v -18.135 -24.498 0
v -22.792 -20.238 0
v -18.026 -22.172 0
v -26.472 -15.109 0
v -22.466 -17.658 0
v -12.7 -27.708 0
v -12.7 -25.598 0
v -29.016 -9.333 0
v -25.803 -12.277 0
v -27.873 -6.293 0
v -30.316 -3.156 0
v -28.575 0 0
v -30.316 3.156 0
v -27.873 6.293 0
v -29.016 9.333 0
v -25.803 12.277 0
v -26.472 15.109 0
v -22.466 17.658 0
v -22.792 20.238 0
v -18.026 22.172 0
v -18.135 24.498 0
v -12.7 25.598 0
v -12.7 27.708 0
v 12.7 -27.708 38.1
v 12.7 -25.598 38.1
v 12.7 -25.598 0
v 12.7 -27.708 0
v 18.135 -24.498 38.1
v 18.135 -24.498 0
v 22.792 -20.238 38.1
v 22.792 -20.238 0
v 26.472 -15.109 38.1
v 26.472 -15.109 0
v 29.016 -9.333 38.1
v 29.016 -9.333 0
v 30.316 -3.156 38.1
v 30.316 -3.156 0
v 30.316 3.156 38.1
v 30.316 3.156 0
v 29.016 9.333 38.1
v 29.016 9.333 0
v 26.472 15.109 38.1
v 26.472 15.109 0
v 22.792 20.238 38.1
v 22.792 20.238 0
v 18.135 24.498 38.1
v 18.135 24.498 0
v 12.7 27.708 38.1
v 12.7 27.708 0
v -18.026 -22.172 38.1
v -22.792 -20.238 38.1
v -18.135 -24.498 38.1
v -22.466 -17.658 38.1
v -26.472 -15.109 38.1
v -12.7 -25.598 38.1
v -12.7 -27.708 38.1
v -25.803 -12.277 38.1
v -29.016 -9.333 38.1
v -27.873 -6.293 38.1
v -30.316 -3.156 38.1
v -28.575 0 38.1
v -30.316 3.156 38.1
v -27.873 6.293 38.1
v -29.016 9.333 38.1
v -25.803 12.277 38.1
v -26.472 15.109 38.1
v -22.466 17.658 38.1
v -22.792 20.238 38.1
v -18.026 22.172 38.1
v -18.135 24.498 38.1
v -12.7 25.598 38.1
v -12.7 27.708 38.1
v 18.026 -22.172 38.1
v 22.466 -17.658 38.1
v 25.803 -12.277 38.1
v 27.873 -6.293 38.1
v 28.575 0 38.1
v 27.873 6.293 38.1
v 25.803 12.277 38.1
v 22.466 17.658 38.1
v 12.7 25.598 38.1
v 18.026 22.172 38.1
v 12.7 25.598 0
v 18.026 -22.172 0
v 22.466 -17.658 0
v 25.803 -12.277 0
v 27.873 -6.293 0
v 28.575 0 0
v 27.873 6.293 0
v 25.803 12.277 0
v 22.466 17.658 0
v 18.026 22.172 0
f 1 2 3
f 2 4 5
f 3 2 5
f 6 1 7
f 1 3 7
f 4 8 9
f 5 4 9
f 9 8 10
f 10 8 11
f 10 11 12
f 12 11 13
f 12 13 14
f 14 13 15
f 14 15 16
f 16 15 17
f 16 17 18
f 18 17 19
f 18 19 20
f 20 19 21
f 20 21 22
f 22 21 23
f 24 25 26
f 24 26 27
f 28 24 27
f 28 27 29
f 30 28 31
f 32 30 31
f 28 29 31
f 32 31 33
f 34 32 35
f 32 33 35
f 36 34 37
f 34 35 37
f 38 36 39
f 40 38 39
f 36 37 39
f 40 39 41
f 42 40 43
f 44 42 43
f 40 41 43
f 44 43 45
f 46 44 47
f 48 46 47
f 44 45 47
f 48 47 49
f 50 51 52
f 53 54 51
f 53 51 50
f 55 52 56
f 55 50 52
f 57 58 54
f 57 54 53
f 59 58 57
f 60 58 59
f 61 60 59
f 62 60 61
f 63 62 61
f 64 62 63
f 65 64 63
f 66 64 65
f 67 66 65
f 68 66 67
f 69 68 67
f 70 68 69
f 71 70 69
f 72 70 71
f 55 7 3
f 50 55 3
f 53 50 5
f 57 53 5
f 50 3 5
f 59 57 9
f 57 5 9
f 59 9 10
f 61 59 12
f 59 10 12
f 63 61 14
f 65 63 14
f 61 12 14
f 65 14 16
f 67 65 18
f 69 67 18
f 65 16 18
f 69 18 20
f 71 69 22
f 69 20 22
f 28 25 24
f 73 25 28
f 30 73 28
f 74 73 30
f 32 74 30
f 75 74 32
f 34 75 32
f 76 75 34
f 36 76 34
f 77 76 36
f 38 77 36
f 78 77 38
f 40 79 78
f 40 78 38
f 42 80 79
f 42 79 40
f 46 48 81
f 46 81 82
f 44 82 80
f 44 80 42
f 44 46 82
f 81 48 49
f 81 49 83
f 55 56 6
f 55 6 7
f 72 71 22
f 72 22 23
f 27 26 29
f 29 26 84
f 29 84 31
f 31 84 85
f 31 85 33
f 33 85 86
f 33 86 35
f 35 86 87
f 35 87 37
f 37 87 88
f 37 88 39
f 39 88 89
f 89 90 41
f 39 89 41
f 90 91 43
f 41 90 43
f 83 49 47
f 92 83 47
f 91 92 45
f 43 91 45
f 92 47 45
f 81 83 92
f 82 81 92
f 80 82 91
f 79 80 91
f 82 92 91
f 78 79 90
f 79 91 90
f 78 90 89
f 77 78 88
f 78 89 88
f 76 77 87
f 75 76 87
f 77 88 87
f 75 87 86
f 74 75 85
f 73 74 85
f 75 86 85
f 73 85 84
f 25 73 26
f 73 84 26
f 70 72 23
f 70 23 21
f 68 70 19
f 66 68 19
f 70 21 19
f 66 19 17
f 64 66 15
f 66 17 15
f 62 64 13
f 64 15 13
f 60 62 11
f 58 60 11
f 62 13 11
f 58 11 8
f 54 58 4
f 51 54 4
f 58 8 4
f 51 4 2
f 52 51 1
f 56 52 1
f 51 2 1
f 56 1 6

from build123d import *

# Parameters (mm, degrees)
F1_DEPTH = 38.1


with BuildPart() as f1:
    # F0 (on Top) → F1 (new body)
    with BuildSketch(Plane.XY):
        with BuildLine():
            ThreePointArc((-12.7, -25.597668), (-28.575, 0), (-12.7, 25.597668))
            Line((-12.7, 25.597668), (-12.7, 27.708129))
            ThreePointArc((-12.7, 27.708129), (-30.48, 0), (-12.7, -27.708129))
            Line((-12.7, -27.708129), (-12.7, -25.597668))
        make_face()
        with BuildLine():
            Line((12.7, 27.708129), (12.7, 25.597668))
            ThreePointArc((12.7, 25.597668), (28.575, 0), (12.7, -25.597668))
            Line((12.7, -25.597668), (12.7, -27.708129))
            ThreePointArc((12.7, -27.708129), (30.48, 0), (12.7, 27.708129))
        make_face()
    extrude(amount=F1_DEPTH)


solid = f1.part
